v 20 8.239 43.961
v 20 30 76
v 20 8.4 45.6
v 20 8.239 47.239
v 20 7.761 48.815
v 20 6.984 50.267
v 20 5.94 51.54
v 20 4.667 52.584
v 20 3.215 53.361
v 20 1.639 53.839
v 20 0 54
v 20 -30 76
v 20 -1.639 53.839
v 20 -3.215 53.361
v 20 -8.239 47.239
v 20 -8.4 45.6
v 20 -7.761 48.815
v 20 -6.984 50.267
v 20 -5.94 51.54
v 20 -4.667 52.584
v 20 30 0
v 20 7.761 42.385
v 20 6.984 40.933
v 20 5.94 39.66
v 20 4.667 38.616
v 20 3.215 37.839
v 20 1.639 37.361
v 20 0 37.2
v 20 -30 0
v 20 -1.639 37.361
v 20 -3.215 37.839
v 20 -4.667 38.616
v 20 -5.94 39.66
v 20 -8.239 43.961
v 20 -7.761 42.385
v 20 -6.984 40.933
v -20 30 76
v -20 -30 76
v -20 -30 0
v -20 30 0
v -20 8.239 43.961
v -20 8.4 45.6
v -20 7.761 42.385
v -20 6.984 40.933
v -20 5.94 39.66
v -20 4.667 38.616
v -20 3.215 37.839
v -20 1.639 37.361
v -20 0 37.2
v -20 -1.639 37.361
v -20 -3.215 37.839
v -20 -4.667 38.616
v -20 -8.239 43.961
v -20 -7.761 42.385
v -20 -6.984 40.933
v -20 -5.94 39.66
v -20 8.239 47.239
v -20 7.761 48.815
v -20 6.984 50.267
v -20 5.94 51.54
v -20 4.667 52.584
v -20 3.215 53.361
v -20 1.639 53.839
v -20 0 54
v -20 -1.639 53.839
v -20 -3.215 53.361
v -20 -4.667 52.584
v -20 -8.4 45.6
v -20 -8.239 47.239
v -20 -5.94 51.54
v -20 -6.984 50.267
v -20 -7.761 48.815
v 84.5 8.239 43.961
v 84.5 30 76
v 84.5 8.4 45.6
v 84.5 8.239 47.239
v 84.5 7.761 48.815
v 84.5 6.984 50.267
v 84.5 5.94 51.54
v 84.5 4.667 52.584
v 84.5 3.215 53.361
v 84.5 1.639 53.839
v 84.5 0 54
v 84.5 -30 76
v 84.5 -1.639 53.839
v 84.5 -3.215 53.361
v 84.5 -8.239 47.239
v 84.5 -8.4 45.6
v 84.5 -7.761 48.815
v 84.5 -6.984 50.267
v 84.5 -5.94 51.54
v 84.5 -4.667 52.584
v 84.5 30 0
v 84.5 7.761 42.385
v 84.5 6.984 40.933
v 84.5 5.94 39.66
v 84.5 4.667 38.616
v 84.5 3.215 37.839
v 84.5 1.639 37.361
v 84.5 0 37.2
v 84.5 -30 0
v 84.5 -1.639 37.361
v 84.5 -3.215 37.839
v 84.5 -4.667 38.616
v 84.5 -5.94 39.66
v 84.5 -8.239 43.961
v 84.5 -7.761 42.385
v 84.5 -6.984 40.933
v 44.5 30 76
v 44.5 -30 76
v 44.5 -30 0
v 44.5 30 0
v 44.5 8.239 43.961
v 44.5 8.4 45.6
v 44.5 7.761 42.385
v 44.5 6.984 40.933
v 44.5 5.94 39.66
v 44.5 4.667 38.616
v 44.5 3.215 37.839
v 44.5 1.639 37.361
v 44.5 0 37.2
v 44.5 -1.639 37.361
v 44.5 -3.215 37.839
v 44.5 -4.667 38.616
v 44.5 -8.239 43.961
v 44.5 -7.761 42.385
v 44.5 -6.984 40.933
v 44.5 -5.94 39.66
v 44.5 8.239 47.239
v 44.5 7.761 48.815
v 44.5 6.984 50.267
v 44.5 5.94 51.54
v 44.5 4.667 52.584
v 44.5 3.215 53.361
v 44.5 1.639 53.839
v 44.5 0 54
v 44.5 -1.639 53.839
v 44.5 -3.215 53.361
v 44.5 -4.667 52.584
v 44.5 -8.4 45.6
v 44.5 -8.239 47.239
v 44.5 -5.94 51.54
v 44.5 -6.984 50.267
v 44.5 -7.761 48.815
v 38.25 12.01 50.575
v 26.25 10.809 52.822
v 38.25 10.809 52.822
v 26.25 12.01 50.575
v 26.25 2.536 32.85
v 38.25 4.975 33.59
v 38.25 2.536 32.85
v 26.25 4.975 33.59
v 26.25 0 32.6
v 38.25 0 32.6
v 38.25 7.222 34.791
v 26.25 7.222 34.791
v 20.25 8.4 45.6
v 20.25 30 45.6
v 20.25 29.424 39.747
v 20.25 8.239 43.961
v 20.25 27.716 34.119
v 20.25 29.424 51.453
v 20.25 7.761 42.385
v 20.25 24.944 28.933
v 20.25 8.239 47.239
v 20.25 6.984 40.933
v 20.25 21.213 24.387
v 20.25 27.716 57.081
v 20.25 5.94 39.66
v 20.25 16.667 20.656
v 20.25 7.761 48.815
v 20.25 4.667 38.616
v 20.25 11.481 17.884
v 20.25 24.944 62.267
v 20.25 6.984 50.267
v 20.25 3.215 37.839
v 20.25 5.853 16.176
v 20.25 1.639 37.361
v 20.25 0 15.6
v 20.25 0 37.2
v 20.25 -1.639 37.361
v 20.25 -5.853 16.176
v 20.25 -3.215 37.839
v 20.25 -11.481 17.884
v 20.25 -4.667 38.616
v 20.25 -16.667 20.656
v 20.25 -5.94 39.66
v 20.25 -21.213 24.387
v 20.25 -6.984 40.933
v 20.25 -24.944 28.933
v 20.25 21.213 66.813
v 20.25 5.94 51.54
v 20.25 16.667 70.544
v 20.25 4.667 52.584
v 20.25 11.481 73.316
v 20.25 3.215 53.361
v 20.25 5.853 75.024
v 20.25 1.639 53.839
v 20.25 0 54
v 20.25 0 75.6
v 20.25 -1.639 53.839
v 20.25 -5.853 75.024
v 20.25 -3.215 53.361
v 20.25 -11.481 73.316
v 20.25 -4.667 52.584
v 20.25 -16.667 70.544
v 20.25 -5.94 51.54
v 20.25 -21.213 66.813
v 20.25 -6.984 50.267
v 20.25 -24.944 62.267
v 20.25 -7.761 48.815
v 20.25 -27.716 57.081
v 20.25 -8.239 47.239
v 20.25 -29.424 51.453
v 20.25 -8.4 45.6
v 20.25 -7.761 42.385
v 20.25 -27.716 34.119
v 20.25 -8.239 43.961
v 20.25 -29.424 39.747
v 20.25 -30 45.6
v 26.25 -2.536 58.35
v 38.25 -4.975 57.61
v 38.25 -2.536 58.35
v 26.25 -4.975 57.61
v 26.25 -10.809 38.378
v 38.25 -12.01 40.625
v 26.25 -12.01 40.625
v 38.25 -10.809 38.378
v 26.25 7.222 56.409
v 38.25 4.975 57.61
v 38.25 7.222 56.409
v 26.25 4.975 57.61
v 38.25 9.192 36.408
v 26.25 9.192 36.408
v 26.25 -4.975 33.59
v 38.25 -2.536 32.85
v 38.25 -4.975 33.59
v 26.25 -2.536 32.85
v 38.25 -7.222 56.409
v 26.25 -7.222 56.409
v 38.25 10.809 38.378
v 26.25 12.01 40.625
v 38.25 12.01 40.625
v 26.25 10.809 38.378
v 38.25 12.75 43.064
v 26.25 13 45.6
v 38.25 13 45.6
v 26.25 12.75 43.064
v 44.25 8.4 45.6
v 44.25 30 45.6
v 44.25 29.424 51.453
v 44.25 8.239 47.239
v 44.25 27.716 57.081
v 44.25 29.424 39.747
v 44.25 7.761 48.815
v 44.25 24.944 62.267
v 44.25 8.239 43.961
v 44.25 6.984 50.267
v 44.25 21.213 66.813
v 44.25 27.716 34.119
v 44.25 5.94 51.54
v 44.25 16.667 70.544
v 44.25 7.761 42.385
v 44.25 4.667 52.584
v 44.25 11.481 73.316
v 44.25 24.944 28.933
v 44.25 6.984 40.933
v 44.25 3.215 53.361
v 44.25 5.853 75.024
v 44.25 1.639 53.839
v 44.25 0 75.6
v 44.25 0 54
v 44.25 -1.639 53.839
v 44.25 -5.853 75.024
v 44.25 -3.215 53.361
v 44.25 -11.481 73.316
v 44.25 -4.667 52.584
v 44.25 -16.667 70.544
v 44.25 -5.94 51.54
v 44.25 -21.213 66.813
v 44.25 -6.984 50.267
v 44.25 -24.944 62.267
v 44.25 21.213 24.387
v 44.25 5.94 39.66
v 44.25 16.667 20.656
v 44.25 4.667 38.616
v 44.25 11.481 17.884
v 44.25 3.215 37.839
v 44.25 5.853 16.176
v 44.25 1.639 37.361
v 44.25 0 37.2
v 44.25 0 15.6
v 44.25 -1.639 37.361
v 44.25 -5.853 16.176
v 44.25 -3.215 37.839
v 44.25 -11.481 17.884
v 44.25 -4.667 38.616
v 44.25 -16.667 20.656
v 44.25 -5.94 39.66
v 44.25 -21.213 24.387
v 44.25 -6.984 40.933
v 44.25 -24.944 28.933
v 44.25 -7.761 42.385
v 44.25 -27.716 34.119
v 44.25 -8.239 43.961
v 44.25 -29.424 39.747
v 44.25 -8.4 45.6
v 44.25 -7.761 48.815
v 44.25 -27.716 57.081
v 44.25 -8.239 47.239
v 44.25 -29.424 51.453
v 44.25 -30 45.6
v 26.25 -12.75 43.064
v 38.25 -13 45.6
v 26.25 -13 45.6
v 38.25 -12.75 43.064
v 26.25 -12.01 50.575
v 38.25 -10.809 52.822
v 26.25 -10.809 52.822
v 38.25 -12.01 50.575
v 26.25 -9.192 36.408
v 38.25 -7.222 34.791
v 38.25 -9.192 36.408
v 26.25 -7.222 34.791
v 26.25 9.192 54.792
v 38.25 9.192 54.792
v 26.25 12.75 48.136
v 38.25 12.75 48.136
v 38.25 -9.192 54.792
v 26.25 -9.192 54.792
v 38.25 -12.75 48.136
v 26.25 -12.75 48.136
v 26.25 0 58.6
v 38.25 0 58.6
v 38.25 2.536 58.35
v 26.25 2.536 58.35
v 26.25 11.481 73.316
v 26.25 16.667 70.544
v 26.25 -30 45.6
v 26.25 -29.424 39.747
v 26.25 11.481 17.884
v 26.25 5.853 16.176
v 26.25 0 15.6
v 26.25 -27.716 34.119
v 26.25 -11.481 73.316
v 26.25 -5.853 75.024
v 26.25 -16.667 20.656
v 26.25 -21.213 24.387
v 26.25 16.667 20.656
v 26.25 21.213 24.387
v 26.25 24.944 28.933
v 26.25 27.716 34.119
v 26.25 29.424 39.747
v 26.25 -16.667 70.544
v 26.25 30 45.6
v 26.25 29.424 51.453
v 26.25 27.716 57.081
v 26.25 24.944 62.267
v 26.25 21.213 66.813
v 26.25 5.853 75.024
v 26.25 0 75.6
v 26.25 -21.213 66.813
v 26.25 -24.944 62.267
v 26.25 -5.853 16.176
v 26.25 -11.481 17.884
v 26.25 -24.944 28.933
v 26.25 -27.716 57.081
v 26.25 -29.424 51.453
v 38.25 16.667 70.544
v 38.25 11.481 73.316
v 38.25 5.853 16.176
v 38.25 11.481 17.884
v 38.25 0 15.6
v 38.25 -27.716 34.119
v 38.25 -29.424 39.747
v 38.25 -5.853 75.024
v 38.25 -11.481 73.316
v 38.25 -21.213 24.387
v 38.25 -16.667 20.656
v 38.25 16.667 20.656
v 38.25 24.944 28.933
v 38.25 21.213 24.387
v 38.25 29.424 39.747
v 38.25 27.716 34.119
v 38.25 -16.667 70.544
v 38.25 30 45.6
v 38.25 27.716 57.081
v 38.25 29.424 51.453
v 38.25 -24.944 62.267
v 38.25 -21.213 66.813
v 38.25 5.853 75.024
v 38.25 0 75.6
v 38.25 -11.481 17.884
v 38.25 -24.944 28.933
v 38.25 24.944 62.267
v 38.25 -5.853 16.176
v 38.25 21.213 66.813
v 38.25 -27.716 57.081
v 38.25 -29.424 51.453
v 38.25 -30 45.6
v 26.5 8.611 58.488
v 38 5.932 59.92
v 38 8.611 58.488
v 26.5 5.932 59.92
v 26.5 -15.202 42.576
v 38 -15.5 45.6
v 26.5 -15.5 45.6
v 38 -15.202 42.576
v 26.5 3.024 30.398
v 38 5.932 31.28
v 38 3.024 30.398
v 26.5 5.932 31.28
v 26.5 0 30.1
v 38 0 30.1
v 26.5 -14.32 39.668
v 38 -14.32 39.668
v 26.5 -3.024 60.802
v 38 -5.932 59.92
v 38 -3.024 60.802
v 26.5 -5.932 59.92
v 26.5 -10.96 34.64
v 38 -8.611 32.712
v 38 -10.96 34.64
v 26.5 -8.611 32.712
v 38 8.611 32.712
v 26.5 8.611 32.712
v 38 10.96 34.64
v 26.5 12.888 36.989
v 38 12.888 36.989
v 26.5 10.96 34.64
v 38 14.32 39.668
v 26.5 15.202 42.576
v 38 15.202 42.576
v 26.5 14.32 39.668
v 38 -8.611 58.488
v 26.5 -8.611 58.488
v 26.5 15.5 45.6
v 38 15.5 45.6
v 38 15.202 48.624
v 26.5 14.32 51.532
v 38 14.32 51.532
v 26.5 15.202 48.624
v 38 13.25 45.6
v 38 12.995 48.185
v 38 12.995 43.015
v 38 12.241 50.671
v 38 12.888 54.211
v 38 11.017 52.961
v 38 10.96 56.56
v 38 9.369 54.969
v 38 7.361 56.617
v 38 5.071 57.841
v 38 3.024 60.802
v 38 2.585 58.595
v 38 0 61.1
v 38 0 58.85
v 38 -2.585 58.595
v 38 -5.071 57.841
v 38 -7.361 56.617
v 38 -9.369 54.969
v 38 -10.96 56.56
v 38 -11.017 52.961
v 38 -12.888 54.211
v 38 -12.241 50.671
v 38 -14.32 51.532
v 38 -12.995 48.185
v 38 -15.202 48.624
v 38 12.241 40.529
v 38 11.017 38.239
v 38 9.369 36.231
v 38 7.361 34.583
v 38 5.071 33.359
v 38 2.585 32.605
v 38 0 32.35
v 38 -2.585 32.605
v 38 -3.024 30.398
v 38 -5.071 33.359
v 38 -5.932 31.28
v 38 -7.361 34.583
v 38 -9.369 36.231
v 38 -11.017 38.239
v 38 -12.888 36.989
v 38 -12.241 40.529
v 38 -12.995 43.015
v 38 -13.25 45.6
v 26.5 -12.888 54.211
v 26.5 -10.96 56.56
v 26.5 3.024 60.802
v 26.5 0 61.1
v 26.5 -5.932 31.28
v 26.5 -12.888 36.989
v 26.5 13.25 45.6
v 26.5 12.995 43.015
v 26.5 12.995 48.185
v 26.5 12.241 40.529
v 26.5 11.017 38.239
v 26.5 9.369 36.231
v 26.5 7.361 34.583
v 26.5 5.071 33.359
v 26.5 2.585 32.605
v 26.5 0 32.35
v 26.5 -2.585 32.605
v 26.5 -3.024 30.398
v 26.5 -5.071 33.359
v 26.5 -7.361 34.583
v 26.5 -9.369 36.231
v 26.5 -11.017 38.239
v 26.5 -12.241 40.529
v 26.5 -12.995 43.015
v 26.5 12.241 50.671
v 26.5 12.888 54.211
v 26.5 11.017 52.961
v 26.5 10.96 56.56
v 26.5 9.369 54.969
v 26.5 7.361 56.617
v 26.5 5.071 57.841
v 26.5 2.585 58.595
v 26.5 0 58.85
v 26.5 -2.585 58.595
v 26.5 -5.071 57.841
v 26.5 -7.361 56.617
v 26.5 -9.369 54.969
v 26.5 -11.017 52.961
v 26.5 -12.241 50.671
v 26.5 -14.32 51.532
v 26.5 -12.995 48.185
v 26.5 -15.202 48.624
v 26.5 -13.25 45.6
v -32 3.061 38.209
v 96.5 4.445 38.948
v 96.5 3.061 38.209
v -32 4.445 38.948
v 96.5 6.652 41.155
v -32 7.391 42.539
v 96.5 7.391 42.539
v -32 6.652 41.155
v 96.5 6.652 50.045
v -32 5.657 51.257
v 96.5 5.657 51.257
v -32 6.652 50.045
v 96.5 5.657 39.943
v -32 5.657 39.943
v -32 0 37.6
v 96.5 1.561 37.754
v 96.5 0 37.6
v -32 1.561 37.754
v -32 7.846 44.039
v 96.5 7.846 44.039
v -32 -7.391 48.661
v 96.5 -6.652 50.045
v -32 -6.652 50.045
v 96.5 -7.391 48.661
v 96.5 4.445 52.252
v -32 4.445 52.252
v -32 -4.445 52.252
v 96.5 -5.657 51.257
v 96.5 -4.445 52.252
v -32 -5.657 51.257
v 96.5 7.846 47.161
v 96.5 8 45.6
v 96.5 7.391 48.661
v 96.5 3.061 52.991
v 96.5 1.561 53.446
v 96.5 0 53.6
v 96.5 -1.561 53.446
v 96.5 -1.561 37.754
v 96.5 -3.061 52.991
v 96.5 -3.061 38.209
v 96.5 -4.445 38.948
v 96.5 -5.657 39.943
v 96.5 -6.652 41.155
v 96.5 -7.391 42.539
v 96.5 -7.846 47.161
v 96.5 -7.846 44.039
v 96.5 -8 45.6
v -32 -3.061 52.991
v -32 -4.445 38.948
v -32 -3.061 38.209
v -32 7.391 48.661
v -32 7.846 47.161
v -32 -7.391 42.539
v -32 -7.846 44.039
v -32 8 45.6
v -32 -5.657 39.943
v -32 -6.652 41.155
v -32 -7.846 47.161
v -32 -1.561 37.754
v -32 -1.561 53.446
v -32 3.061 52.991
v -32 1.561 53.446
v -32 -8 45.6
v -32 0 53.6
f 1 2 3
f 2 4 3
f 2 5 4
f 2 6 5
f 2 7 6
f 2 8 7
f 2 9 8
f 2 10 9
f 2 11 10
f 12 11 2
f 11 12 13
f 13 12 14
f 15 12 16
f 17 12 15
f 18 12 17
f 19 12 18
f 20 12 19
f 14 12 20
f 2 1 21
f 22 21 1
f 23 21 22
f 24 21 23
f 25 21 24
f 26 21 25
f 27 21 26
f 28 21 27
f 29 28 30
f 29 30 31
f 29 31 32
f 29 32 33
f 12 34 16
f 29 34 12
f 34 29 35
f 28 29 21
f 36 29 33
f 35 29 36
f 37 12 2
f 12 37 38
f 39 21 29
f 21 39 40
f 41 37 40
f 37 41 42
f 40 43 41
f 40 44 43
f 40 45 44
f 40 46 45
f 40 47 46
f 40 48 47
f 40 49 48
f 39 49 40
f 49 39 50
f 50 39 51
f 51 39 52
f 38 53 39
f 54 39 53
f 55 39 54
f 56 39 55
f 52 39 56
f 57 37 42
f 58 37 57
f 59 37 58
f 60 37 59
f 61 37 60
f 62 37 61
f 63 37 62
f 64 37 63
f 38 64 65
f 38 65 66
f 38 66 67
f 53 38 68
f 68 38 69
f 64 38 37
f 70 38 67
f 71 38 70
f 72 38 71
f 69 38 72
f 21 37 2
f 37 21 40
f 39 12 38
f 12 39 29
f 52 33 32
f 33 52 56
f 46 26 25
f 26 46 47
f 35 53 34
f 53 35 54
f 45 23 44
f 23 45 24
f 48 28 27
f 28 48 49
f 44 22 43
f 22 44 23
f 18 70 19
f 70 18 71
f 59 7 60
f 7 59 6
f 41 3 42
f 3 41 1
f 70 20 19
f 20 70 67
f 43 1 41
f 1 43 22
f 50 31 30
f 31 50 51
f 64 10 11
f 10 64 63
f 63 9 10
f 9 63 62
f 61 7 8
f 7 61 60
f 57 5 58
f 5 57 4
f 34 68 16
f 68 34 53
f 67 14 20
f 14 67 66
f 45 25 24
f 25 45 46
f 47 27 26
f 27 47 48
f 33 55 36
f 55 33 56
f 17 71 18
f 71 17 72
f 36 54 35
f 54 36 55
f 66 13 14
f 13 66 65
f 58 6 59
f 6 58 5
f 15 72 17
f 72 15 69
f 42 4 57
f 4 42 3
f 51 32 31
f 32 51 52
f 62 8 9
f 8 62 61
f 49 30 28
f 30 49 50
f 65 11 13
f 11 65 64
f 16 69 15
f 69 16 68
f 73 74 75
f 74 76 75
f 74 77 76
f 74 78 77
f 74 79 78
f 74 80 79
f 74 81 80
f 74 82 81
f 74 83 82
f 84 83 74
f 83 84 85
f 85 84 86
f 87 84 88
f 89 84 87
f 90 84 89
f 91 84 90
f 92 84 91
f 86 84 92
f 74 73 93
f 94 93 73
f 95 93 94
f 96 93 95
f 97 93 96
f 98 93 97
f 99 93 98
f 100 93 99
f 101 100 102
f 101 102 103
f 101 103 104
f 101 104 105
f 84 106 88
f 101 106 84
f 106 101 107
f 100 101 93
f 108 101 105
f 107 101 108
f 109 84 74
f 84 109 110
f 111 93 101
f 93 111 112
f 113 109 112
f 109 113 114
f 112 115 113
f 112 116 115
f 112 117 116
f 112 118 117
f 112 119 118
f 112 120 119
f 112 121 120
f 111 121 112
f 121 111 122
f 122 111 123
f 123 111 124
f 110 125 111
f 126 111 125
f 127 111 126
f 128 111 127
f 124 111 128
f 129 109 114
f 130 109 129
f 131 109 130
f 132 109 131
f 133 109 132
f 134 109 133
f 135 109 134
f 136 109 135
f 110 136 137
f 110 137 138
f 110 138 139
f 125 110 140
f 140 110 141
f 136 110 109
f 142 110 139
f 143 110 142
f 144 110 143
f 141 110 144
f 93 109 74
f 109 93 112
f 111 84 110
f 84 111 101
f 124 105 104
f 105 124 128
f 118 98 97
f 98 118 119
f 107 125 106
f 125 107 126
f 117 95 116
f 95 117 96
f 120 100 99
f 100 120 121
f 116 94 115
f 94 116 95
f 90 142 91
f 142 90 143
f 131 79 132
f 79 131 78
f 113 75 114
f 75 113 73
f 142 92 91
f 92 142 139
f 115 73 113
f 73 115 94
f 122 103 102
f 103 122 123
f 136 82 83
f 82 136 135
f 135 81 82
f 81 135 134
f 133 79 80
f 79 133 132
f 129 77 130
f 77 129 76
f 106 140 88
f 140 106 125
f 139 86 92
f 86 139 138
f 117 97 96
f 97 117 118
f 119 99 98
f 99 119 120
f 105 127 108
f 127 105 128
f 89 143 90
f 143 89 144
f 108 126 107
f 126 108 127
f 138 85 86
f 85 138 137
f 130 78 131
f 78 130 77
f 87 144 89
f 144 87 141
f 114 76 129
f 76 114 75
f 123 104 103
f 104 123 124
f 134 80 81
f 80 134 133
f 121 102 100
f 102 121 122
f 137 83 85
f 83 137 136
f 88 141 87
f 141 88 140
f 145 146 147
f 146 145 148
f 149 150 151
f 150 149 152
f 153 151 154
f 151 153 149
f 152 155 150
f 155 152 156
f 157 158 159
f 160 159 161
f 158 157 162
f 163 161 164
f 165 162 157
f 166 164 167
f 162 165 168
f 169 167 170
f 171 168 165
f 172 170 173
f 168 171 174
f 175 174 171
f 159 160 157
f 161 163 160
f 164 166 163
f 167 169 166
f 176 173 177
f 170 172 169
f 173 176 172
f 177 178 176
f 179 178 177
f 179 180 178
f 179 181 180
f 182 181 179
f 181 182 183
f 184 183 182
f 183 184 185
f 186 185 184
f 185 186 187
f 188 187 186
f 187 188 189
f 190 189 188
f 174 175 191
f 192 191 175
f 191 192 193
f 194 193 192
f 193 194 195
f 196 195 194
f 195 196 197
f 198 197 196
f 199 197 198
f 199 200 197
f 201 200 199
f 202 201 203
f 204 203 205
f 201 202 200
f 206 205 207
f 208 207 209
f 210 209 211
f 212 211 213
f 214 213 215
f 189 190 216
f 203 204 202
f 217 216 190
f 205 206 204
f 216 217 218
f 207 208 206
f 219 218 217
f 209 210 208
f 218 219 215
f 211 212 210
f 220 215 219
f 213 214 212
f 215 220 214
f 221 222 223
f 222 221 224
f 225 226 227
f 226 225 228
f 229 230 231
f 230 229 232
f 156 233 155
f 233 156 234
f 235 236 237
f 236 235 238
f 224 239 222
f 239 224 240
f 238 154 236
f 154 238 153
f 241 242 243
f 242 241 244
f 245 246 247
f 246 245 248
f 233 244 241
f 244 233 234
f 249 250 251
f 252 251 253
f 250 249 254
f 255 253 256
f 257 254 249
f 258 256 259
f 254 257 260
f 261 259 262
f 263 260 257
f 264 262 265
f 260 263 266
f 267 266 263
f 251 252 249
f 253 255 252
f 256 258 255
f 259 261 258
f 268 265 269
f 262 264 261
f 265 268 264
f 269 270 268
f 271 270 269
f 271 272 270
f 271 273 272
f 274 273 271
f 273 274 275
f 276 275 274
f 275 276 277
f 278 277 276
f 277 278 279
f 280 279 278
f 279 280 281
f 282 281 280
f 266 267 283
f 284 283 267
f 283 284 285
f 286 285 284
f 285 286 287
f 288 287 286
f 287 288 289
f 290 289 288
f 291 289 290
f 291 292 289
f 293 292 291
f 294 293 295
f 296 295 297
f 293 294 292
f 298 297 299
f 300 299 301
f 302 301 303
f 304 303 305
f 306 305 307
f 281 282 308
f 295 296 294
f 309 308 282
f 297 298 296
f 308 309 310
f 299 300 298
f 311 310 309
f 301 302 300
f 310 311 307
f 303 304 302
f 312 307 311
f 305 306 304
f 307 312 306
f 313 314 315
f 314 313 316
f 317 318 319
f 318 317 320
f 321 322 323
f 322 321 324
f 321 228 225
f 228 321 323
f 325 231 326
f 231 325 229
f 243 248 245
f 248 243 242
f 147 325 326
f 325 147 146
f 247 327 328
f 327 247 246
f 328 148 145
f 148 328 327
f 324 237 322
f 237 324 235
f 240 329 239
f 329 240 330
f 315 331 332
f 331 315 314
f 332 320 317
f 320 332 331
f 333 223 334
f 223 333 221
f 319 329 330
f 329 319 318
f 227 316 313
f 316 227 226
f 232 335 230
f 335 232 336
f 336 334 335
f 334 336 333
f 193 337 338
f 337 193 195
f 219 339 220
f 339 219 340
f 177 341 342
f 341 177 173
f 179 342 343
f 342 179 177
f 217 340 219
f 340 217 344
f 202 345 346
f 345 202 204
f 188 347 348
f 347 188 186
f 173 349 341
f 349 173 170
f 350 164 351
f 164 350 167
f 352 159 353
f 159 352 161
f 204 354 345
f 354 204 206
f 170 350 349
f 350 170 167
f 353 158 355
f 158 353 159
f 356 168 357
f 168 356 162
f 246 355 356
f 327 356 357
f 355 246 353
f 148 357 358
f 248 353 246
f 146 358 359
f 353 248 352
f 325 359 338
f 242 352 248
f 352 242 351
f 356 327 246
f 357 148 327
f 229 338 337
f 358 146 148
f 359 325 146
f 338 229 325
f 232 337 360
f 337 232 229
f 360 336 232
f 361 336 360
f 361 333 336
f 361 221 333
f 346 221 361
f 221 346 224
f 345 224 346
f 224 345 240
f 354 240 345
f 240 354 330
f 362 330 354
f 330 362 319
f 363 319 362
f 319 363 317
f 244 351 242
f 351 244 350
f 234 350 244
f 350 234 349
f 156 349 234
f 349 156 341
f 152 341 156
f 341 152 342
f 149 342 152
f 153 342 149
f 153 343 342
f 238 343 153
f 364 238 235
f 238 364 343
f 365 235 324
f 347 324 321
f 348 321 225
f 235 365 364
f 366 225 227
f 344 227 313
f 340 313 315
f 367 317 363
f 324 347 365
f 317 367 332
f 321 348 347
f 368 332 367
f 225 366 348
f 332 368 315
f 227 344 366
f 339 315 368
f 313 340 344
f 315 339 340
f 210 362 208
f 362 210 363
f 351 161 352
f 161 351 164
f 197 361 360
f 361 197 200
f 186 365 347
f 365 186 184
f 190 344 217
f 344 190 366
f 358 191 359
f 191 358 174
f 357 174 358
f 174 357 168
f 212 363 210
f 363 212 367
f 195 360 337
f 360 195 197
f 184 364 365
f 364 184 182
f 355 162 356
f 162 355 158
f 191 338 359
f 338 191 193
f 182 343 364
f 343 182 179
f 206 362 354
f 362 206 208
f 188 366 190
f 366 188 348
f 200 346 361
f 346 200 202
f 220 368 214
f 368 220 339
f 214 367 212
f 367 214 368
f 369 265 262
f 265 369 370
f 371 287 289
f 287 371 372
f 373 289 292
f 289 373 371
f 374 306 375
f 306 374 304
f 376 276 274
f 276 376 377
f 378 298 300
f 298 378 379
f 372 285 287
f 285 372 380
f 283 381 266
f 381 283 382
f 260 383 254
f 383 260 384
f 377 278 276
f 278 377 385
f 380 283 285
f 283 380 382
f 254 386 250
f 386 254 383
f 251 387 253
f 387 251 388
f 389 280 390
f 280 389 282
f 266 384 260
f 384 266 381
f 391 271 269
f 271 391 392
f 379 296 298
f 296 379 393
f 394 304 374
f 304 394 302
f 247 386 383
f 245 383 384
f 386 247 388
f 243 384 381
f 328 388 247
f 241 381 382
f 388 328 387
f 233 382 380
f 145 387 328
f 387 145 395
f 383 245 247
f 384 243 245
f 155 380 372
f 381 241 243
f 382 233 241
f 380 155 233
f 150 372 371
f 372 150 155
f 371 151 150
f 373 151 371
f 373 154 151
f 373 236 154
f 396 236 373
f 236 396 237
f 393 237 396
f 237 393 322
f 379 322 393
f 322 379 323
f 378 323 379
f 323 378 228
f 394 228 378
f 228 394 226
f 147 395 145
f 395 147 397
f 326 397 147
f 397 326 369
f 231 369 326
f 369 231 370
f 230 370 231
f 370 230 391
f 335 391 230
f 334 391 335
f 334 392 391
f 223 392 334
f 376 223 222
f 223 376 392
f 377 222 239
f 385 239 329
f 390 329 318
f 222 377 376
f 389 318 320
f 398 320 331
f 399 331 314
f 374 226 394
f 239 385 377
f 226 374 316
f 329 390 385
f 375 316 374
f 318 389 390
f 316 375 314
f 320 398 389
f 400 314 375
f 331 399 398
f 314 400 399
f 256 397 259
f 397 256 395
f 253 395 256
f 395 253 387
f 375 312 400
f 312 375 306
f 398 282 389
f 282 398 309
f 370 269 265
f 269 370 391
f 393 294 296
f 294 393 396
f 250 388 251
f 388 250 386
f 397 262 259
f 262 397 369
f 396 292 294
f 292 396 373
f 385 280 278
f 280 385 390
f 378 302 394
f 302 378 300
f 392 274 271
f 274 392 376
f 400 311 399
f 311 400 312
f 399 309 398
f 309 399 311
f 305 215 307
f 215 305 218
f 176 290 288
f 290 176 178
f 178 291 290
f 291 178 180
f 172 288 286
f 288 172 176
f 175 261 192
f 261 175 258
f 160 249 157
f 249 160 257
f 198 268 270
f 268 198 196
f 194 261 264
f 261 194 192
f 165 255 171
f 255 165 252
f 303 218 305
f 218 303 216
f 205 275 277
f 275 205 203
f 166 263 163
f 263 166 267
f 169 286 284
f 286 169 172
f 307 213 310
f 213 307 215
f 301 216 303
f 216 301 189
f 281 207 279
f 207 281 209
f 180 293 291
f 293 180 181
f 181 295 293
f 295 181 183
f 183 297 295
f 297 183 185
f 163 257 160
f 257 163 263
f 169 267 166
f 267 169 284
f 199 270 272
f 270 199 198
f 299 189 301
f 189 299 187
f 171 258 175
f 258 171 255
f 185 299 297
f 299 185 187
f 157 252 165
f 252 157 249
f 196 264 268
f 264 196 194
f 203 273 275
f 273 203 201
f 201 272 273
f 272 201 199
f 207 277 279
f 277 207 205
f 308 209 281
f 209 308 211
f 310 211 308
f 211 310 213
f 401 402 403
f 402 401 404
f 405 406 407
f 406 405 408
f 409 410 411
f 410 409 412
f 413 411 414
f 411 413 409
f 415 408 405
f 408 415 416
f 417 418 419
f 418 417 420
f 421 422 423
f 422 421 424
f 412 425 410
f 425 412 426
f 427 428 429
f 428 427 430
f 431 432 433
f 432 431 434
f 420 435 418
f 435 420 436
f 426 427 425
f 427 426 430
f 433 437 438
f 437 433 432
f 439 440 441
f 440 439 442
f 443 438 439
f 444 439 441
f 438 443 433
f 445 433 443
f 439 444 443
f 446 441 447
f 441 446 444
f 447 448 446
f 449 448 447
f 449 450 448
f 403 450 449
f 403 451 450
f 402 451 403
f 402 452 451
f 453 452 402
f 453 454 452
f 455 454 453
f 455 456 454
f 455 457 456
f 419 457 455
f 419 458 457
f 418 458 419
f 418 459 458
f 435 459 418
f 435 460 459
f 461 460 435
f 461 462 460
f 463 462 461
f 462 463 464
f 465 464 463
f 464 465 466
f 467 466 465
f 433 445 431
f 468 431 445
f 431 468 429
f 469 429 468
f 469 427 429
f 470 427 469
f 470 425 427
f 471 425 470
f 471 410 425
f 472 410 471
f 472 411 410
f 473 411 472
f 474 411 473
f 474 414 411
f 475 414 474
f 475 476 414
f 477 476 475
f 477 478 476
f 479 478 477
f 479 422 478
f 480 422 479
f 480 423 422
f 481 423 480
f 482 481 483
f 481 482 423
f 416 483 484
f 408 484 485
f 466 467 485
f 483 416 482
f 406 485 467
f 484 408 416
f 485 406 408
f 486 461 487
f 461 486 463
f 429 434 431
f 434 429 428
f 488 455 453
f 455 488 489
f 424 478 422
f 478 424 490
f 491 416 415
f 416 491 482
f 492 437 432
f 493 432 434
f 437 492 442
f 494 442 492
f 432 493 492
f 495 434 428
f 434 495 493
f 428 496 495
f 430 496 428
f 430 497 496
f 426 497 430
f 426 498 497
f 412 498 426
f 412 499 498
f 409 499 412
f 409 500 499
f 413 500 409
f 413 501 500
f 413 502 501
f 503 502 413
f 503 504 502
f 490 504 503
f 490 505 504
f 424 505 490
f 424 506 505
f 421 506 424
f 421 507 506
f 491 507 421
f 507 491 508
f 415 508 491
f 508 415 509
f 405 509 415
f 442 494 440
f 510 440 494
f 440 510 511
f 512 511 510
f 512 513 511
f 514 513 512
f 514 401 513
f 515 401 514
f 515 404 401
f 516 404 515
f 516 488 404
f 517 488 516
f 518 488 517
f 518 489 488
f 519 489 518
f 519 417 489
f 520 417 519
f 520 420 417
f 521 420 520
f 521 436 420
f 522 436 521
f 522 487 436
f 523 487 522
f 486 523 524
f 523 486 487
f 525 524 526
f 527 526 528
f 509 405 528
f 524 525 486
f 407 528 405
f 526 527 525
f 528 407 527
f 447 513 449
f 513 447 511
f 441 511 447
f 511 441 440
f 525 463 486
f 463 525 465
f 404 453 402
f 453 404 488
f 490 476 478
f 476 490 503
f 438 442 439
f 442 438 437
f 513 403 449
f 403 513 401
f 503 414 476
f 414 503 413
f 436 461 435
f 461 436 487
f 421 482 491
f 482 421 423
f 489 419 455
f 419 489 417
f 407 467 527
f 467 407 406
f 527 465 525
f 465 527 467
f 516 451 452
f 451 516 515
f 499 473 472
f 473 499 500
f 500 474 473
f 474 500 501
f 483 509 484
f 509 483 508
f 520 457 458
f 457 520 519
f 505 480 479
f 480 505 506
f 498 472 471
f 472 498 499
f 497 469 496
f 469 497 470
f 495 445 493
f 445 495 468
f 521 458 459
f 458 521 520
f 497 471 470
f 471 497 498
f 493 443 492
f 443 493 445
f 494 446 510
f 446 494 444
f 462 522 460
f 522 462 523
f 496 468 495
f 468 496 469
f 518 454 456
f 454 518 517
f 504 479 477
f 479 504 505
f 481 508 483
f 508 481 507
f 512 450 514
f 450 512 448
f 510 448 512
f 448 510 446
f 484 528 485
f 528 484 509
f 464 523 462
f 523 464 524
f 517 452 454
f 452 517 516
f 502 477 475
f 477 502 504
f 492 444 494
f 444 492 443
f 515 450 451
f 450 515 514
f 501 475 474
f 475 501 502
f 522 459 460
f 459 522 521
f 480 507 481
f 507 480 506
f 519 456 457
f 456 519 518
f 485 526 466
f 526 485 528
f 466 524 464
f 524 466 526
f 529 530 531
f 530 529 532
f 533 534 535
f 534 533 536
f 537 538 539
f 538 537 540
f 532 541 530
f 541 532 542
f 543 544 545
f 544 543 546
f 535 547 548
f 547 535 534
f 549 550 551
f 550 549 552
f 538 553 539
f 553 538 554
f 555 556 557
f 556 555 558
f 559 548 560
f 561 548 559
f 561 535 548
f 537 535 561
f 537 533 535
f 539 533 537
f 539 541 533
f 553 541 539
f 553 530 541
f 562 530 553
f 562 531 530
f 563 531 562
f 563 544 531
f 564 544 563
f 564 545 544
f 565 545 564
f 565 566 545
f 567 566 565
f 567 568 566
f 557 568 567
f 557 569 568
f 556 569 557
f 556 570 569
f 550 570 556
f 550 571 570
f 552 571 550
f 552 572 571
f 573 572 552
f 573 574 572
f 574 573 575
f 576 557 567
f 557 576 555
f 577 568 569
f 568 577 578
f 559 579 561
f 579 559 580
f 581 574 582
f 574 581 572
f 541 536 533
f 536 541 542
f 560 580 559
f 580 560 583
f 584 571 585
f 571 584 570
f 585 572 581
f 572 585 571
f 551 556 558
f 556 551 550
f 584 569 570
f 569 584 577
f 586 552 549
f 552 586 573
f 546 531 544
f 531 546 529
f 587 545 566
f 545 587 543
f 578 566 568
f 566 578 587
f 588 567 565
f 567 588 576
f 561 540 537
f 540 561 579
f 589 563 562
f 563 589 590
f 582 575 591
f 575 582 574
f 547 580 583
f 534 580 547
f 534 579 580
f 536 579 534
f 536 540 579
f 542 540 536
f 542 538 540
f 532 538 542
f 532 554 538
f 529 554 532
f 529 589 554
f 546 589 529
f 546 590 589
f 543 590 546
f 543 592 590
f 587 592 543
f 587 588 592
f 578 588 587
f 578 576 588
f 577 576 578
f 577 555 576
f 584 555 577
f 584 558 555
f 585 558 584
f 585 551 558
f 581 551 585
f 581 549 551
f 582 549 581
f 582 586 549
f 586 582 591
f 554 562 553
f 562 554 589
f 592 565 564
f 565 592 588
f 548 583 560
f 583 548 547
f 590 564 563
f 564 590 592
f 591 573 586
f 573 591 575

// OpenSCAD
$fn = 32;

// ------------------------------------------------------------------------
// Pulley assembly: d60 pulley with a belt, shaft d16
// Every part is its own module, assembly() places them once.
// ------------------------------------------------------------------------

// --- part 1 ---
module support1() {
  difference() {
    translate([-20, -30, 0]) cube([40, 60, 76]);
    translate([0, 0, 45.6]) rotate([0, 90, 0]) cylinder(h = 42, d = 16.8, center = true);
  }
}

// --- part 2 ---
module support2() {
  difference() {
    translate([-20, -30, 0]) cube([40, 60, 76]);
    translate([0, 0, 45.6]) rotate([0, 90, 0]) cylinder(h = 42, d = 16.8, center = true);
  }
}

// --- part 3 ---
module shaft() {
  translate([0, 0, -64.25]) cylinder(h = 128.5, d = 16);
}

// --- part 4 ---
module pulley() {
  difference() {
    union() {
      cylinder(h = 24, d = 26);
      cylinder(h = 6, d = 60);
      translate([0, 0, 18]) cylinder(h = 6, d = 60);
    }
    translate([0, 0, -1]) cylinder(h = 26, d = 16.8);
  }
}

// --- part 5 ---
module belt() {
  difference() {
      translate([0, 0, 0]) cylinder(h = 11.5, d = 31);
      translate([0, 0, -1]) cylinder(h = 13.5, d = 26.5);
    }
}

// --- assembly ---
module assembly() {
  translate([0, 0, 0]) rotate([0, 0, 0]) support1();
  translate([64.5, 0, 0]) rotate([0, 0, 0]) support2();
  translate([32.25, 0, 45.6]) rotate([0, 90, 0]) shaft();
  translate([20.25, 0, 45.6]) rotate([0, 90, 0]) pulley();
  translate([26.5, 0, 45.6]) rotate([0, 90, 0]) belt();
}

assembly();
